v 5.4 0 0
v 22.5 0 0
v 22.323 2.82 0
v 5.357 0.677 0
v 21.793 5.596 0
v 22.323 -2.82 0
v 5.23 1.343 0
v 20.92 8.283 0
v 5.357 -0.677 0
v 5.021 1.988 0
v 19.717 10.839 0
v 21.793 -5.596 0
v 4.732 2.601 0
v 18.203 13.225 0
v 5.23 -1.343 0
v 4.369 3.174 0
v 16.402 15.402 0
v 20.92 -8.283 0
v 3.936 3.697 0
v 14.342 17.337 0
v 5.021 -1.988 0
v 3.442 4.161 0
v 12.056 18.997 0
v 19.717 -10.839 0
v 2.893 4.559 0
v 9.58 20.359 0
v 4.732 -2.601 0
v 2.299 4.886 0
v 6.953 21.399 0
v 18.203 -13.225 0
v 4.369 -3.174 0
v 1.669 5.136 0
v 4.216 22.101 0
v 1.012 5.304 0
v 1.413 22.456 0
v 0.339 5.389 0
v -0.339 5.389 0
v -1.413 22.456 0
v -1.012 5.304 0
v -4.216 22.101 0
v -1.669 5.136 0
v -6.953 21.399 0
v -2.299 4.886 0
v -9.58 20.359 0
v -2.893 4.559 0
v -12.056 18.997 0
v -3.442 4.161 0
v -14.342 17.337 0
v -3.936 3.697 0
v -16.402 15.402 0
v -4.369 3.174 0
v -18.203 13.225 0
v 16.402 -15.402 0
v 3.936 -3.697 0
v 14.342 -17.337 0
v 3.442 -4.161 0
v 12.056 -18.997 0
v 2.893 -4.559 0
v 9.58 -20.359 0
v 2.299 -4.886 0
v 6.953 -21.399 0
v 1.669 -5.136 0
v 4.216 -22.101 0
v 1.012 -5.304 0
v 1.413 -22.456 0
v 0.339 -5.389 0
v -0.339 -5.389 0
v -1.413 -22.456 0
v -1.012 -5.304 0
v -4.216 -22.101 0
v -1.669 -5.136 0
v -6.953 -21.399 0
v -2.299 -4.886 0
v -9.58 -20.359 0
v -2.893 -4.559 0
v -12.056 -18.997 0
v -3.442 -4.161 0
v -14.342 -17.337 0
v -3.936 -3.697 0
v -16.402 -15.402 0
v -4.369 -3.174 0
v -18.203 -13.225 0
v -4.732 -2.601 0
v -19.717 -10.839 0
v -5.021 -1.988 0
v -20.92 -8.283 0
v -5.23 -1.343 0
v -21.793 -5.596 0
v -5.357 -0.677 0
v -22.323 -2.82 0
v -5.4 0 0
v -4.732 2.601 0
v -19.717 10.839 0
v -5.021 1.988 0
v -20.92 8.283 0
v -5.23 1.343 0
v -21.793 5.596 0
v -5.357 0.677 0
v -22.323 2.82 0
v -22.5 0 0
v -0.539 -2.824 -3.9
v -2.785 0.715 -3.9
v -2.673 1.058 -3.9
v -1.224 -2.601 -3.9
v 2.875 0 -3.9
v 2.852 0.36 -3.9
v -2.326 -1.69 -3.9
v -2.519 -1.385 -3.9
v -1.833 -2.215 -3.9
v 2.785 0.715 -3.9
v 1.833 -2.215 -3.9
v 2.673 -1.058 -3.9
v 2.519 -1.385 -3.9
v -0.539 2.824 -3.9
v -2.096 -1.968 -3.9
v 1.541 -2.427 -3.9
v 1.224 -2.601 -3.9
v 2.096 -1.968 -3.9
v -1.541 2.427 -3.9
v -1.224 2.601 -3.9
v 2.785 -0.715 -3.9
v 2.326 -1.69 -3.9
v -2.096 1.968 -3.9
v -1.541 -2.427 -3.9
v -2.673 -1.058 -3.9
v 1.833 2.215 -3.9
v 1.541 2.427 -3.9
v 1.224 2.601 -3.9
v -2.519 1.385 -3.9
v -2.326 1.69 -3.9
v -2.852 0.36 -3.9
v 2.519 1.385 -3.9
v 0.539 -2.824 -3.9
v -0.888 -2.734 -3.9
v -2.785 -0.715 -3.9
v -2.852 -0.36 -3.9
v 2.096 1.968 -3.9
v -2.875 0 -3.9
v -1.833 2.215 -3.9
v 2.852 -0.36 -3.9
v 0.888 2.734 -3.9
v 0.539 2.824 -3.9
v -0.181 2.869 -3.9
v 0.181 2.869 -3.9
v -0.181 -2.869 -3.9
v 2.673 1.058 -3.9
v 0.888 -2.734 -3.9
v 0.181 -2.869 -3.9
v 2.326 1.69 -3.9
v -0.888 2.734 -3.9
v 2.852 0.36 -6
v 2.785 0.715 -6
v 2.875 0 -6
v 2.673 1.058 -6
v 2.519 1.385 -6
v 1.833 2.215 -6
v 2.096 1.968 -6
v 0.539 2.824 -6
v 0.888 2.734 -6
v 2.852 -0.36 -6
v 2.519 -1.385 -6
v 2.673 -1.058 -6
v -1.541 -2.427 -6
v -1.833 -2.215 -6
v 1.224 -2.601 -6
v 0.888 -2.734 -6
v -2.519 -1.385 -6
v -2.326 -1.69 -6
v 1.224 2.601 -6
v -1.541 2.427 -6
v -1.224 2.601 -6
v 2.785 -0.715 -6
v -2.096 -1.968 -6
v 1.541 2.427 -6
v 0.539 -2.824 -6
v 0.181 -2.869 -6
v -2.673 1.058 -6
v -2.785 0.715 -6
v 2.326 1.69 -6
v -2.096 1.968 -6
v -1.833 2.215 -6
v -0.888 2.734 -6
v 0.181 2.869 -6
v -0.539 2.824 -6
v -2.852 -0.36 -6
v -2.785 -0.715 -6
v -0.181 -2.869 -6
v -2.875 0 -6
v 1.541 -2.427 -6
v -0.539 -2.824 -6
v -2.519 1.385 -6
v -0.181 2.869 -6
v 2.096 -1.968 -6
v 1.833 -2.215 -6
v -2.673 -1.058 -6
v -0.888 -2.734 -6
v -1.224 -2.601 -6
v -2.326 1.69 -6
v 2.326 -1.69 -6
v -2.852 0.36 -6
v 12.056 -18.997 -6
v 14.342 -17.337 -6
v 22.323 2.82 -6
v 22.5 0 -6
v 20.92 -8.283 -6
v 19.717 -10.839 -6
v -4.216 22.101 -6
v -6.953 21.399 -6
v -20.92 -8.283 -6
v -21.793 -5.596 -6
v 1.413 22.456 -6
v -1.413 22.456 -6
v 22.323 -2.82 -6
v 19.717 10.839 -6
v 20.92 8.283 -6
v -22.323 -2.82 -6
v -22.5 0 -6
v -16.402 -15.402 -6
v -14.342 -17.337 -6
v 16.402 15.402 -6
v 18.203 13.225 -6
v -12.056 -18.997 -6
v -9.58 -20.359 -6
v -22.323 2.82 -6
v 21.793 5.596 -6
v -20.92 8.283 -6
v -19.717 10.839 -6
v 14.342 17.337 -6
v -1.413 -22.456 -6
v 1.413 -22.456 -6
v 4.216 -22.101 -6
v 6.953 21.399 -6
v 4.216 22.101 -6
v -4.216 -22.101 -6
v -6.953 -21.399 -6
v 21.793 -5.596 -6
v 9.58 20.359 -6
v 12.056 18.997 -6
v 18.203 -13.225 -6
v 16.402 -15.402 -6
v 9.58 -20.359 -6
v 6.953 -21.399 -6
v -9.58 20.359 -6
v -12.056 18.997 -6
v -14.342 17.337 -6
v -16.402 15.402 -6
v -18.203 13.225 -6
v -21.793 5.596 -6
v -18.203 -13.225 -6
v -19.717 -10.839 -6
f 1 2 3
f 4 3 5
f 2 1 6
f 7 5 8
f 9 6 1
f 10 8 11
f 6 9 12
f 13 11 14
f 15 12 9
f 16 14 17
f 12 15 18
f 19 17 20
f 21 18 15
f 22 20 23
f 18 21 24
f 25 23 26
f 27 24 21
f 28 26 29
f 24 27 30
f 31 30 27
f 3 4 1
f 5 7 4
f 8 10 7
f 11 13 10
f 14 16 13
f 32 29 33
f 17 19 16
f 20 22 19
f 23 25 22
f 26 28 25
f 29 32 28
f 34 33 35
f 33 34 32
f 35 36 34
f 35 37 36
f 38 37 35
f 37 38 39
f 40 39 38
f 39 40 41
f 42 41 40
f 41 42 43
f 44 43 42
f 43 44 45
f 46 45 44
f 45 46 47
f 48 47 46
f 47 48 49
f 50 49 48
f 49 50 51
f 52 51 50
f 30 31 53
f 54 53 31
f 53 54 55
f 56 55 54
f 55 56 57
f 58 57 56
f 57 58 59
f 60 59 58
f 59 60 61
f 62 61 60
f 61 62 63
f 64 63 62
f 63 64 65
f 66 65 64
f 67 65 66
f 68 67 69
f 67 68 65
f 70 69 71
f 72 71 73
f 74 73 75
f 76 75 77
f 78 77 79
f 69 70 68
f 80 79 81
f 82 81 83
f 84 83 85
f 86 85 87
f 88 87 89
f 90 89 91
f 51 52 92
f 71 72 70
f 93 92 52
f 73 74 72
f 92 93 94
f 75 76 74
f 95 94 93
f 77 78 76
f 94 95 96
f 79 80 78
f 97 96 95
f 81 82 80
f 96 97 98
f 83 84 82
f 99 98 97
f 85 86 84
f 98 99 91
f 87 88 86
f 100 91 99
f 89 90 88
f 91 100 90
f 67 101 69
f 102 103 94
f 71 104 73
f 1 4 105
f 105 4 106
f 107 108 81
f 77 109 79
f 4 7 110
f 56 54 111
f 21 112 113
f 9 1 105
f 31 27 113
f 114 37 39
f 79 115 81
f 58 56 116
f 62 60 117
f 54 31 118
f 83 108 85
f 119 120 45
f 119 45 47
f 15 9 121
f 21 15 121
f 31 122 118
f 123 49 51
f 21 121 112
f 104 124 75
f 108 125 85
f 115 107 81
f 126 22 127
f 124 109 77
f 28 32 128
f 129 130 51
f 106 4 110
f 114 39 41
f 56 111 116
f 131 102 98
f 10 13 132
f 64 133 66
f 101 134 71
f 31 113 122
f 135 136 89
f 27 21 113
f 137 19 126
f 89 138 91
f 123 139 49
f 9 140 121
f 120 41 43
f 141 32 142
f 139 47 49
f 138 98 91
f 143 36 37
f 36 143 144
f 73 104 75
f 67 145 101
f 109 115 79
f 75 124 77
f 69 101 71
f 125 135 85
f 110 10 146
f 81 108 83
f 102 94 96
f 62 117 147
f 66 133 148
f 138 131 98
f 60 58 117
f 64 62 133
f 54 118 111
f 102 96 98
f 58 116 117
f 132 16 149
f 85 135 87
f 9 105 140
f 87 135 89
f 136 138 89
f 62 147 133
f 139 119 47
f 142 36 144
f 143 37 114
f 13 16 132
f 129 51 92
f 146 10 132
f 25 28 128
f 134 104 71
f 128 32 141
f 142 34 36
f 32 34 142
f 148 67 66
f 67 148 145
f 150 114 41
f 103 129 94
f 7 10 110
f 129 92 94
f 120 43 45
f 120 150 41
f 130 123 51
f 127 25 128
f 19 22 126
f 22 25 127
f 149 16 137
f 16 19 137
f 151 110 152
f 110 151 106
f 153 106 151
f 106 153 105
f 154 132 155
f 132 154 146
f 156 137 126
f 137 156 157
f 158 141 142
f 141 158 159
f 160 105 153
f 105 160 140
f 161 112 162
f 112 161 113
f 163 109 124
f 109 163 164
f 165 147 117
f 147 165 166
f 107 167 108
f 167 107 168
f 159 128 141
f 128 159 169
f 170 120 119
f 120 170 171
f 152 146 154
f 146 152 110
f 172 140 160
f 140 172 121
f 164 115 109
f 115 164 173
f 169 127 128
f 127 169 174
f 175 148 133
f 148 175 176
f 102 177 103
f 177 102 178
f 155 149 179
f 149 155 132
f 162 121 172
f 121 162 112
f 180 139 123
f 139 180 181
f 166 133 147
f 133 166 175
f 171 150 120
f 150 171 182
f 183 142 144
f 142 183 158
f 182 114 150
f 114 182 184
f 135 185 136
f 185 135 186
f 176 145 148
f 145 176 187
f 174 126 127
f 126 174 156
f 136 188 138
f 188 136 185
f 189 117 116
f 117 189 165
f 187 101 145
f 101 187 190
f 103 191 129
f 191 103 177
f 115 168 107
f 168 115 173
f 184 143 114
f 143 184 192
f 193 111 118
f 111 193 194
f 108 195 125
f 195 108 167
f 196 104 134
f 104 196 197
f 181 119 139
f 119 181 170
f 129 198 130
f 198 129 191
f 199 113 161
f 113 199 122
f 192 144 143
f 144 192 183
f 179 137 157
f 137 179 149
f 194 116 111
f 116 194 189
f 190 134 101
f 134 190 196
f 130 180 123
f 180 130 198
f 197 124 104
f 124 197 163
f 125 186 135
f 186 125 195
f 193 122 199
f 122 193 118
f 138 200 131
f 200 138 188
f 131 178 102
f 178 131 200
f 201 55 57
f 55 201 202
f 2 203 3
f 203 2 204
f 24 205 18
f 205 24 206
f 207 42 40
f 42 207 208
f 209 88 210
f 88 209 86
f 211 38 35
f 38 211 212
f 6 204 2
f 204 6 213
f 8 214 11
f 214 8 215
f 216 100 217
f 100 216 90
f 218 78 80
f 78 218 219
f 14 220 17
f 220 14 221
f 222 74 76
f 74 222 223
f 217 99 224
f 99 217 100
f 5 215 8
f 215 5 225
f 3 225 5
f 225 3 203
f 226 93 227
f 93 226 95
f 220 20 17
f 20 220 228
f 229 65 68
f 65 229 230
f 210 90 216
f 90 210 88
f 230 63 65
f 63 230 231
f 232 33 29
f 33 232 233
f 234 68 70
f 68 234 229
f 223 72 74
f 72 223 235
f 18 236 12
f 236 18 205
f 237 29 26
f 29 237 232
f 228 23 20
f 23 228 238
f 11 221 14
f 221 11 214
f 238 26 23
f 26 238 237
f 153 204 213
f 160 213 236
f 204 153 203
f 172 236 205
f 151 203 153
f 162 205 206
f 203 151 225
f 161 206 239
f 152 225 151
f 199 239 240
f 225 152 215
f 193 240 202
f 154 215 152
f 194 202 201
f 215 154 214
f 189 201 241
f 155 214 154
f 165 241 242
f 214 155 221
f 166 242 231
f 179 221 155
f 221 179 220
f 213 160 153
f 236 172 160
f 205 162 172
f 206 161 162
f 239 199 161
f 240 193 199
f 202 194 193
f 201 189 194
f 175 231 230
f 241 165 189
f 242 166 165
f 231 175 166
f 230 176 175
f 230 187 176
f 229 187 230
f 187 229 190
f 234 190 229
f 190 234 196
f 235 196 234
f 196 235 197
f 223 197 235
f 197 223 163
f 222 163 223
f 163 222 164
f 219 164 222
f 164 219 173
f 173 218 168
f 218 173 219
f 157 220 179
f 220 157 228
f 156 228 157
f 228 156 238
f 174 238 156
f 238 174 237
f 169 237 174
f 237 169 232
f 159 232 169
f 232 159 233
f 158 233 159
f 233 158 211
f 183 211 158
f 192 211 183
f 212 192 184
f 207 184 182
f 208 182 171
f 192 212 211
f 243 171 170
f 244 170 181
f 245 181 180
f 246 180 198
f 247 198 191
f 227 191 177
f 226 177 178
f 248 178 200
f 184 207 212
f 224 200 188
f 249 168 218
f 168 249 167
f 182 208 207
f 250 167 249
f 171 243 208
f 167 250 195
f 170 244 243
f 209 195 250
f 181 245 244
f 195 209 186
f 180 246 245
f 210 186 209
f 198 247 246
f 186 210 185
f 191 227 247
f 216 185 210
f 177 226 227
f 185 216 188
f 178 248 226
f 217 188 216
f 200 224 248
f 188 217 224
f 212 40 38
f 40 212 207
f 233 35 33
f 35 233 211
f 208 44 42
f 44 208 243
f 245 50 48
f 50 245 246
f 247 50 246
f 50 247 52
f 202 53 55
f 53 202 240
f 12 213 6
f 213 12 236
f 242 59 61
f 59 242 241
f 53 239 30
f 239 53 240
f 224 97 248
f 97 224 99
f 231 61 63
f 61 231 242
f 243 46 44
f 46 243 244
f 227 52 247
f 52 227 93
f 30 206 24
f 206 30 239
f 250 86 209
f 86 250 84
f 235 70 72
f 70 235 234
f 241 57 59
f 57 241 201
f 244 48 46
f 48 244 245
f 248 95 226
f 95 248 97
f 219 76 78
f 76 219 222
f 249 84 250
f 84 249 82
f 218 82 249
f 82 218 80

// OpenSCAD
$fn = 50;

difference() {
	union() {
		translate(v = [0, 0, -6.0]) {
			cylinder(h = 6, r = 22.5);
		}
	}
	union() {
		translate(v = [0, 0, 0]) {
			rotate(a = [0, 0, 0]) {
				difference() {
					union() {
						translate(v = [0, 0, -9.0]) {
							cylinder(h = 9, r = 2.6);
						}
						translate(v = [0, 0, -3.9]) {
							cylinder(h = 3.9, r1 = 2.875, r2 = 5.4);
						}
						translate(v = [0, 0, -9.0]) {
							cylinder(h = 9, r = 2.875);
						}
						translate(v = [0, 0, -9.0]) {
							cylinder(h = 9, r = 2.6);
						}
					}
					union();
				}
			}
		}
	}
}
